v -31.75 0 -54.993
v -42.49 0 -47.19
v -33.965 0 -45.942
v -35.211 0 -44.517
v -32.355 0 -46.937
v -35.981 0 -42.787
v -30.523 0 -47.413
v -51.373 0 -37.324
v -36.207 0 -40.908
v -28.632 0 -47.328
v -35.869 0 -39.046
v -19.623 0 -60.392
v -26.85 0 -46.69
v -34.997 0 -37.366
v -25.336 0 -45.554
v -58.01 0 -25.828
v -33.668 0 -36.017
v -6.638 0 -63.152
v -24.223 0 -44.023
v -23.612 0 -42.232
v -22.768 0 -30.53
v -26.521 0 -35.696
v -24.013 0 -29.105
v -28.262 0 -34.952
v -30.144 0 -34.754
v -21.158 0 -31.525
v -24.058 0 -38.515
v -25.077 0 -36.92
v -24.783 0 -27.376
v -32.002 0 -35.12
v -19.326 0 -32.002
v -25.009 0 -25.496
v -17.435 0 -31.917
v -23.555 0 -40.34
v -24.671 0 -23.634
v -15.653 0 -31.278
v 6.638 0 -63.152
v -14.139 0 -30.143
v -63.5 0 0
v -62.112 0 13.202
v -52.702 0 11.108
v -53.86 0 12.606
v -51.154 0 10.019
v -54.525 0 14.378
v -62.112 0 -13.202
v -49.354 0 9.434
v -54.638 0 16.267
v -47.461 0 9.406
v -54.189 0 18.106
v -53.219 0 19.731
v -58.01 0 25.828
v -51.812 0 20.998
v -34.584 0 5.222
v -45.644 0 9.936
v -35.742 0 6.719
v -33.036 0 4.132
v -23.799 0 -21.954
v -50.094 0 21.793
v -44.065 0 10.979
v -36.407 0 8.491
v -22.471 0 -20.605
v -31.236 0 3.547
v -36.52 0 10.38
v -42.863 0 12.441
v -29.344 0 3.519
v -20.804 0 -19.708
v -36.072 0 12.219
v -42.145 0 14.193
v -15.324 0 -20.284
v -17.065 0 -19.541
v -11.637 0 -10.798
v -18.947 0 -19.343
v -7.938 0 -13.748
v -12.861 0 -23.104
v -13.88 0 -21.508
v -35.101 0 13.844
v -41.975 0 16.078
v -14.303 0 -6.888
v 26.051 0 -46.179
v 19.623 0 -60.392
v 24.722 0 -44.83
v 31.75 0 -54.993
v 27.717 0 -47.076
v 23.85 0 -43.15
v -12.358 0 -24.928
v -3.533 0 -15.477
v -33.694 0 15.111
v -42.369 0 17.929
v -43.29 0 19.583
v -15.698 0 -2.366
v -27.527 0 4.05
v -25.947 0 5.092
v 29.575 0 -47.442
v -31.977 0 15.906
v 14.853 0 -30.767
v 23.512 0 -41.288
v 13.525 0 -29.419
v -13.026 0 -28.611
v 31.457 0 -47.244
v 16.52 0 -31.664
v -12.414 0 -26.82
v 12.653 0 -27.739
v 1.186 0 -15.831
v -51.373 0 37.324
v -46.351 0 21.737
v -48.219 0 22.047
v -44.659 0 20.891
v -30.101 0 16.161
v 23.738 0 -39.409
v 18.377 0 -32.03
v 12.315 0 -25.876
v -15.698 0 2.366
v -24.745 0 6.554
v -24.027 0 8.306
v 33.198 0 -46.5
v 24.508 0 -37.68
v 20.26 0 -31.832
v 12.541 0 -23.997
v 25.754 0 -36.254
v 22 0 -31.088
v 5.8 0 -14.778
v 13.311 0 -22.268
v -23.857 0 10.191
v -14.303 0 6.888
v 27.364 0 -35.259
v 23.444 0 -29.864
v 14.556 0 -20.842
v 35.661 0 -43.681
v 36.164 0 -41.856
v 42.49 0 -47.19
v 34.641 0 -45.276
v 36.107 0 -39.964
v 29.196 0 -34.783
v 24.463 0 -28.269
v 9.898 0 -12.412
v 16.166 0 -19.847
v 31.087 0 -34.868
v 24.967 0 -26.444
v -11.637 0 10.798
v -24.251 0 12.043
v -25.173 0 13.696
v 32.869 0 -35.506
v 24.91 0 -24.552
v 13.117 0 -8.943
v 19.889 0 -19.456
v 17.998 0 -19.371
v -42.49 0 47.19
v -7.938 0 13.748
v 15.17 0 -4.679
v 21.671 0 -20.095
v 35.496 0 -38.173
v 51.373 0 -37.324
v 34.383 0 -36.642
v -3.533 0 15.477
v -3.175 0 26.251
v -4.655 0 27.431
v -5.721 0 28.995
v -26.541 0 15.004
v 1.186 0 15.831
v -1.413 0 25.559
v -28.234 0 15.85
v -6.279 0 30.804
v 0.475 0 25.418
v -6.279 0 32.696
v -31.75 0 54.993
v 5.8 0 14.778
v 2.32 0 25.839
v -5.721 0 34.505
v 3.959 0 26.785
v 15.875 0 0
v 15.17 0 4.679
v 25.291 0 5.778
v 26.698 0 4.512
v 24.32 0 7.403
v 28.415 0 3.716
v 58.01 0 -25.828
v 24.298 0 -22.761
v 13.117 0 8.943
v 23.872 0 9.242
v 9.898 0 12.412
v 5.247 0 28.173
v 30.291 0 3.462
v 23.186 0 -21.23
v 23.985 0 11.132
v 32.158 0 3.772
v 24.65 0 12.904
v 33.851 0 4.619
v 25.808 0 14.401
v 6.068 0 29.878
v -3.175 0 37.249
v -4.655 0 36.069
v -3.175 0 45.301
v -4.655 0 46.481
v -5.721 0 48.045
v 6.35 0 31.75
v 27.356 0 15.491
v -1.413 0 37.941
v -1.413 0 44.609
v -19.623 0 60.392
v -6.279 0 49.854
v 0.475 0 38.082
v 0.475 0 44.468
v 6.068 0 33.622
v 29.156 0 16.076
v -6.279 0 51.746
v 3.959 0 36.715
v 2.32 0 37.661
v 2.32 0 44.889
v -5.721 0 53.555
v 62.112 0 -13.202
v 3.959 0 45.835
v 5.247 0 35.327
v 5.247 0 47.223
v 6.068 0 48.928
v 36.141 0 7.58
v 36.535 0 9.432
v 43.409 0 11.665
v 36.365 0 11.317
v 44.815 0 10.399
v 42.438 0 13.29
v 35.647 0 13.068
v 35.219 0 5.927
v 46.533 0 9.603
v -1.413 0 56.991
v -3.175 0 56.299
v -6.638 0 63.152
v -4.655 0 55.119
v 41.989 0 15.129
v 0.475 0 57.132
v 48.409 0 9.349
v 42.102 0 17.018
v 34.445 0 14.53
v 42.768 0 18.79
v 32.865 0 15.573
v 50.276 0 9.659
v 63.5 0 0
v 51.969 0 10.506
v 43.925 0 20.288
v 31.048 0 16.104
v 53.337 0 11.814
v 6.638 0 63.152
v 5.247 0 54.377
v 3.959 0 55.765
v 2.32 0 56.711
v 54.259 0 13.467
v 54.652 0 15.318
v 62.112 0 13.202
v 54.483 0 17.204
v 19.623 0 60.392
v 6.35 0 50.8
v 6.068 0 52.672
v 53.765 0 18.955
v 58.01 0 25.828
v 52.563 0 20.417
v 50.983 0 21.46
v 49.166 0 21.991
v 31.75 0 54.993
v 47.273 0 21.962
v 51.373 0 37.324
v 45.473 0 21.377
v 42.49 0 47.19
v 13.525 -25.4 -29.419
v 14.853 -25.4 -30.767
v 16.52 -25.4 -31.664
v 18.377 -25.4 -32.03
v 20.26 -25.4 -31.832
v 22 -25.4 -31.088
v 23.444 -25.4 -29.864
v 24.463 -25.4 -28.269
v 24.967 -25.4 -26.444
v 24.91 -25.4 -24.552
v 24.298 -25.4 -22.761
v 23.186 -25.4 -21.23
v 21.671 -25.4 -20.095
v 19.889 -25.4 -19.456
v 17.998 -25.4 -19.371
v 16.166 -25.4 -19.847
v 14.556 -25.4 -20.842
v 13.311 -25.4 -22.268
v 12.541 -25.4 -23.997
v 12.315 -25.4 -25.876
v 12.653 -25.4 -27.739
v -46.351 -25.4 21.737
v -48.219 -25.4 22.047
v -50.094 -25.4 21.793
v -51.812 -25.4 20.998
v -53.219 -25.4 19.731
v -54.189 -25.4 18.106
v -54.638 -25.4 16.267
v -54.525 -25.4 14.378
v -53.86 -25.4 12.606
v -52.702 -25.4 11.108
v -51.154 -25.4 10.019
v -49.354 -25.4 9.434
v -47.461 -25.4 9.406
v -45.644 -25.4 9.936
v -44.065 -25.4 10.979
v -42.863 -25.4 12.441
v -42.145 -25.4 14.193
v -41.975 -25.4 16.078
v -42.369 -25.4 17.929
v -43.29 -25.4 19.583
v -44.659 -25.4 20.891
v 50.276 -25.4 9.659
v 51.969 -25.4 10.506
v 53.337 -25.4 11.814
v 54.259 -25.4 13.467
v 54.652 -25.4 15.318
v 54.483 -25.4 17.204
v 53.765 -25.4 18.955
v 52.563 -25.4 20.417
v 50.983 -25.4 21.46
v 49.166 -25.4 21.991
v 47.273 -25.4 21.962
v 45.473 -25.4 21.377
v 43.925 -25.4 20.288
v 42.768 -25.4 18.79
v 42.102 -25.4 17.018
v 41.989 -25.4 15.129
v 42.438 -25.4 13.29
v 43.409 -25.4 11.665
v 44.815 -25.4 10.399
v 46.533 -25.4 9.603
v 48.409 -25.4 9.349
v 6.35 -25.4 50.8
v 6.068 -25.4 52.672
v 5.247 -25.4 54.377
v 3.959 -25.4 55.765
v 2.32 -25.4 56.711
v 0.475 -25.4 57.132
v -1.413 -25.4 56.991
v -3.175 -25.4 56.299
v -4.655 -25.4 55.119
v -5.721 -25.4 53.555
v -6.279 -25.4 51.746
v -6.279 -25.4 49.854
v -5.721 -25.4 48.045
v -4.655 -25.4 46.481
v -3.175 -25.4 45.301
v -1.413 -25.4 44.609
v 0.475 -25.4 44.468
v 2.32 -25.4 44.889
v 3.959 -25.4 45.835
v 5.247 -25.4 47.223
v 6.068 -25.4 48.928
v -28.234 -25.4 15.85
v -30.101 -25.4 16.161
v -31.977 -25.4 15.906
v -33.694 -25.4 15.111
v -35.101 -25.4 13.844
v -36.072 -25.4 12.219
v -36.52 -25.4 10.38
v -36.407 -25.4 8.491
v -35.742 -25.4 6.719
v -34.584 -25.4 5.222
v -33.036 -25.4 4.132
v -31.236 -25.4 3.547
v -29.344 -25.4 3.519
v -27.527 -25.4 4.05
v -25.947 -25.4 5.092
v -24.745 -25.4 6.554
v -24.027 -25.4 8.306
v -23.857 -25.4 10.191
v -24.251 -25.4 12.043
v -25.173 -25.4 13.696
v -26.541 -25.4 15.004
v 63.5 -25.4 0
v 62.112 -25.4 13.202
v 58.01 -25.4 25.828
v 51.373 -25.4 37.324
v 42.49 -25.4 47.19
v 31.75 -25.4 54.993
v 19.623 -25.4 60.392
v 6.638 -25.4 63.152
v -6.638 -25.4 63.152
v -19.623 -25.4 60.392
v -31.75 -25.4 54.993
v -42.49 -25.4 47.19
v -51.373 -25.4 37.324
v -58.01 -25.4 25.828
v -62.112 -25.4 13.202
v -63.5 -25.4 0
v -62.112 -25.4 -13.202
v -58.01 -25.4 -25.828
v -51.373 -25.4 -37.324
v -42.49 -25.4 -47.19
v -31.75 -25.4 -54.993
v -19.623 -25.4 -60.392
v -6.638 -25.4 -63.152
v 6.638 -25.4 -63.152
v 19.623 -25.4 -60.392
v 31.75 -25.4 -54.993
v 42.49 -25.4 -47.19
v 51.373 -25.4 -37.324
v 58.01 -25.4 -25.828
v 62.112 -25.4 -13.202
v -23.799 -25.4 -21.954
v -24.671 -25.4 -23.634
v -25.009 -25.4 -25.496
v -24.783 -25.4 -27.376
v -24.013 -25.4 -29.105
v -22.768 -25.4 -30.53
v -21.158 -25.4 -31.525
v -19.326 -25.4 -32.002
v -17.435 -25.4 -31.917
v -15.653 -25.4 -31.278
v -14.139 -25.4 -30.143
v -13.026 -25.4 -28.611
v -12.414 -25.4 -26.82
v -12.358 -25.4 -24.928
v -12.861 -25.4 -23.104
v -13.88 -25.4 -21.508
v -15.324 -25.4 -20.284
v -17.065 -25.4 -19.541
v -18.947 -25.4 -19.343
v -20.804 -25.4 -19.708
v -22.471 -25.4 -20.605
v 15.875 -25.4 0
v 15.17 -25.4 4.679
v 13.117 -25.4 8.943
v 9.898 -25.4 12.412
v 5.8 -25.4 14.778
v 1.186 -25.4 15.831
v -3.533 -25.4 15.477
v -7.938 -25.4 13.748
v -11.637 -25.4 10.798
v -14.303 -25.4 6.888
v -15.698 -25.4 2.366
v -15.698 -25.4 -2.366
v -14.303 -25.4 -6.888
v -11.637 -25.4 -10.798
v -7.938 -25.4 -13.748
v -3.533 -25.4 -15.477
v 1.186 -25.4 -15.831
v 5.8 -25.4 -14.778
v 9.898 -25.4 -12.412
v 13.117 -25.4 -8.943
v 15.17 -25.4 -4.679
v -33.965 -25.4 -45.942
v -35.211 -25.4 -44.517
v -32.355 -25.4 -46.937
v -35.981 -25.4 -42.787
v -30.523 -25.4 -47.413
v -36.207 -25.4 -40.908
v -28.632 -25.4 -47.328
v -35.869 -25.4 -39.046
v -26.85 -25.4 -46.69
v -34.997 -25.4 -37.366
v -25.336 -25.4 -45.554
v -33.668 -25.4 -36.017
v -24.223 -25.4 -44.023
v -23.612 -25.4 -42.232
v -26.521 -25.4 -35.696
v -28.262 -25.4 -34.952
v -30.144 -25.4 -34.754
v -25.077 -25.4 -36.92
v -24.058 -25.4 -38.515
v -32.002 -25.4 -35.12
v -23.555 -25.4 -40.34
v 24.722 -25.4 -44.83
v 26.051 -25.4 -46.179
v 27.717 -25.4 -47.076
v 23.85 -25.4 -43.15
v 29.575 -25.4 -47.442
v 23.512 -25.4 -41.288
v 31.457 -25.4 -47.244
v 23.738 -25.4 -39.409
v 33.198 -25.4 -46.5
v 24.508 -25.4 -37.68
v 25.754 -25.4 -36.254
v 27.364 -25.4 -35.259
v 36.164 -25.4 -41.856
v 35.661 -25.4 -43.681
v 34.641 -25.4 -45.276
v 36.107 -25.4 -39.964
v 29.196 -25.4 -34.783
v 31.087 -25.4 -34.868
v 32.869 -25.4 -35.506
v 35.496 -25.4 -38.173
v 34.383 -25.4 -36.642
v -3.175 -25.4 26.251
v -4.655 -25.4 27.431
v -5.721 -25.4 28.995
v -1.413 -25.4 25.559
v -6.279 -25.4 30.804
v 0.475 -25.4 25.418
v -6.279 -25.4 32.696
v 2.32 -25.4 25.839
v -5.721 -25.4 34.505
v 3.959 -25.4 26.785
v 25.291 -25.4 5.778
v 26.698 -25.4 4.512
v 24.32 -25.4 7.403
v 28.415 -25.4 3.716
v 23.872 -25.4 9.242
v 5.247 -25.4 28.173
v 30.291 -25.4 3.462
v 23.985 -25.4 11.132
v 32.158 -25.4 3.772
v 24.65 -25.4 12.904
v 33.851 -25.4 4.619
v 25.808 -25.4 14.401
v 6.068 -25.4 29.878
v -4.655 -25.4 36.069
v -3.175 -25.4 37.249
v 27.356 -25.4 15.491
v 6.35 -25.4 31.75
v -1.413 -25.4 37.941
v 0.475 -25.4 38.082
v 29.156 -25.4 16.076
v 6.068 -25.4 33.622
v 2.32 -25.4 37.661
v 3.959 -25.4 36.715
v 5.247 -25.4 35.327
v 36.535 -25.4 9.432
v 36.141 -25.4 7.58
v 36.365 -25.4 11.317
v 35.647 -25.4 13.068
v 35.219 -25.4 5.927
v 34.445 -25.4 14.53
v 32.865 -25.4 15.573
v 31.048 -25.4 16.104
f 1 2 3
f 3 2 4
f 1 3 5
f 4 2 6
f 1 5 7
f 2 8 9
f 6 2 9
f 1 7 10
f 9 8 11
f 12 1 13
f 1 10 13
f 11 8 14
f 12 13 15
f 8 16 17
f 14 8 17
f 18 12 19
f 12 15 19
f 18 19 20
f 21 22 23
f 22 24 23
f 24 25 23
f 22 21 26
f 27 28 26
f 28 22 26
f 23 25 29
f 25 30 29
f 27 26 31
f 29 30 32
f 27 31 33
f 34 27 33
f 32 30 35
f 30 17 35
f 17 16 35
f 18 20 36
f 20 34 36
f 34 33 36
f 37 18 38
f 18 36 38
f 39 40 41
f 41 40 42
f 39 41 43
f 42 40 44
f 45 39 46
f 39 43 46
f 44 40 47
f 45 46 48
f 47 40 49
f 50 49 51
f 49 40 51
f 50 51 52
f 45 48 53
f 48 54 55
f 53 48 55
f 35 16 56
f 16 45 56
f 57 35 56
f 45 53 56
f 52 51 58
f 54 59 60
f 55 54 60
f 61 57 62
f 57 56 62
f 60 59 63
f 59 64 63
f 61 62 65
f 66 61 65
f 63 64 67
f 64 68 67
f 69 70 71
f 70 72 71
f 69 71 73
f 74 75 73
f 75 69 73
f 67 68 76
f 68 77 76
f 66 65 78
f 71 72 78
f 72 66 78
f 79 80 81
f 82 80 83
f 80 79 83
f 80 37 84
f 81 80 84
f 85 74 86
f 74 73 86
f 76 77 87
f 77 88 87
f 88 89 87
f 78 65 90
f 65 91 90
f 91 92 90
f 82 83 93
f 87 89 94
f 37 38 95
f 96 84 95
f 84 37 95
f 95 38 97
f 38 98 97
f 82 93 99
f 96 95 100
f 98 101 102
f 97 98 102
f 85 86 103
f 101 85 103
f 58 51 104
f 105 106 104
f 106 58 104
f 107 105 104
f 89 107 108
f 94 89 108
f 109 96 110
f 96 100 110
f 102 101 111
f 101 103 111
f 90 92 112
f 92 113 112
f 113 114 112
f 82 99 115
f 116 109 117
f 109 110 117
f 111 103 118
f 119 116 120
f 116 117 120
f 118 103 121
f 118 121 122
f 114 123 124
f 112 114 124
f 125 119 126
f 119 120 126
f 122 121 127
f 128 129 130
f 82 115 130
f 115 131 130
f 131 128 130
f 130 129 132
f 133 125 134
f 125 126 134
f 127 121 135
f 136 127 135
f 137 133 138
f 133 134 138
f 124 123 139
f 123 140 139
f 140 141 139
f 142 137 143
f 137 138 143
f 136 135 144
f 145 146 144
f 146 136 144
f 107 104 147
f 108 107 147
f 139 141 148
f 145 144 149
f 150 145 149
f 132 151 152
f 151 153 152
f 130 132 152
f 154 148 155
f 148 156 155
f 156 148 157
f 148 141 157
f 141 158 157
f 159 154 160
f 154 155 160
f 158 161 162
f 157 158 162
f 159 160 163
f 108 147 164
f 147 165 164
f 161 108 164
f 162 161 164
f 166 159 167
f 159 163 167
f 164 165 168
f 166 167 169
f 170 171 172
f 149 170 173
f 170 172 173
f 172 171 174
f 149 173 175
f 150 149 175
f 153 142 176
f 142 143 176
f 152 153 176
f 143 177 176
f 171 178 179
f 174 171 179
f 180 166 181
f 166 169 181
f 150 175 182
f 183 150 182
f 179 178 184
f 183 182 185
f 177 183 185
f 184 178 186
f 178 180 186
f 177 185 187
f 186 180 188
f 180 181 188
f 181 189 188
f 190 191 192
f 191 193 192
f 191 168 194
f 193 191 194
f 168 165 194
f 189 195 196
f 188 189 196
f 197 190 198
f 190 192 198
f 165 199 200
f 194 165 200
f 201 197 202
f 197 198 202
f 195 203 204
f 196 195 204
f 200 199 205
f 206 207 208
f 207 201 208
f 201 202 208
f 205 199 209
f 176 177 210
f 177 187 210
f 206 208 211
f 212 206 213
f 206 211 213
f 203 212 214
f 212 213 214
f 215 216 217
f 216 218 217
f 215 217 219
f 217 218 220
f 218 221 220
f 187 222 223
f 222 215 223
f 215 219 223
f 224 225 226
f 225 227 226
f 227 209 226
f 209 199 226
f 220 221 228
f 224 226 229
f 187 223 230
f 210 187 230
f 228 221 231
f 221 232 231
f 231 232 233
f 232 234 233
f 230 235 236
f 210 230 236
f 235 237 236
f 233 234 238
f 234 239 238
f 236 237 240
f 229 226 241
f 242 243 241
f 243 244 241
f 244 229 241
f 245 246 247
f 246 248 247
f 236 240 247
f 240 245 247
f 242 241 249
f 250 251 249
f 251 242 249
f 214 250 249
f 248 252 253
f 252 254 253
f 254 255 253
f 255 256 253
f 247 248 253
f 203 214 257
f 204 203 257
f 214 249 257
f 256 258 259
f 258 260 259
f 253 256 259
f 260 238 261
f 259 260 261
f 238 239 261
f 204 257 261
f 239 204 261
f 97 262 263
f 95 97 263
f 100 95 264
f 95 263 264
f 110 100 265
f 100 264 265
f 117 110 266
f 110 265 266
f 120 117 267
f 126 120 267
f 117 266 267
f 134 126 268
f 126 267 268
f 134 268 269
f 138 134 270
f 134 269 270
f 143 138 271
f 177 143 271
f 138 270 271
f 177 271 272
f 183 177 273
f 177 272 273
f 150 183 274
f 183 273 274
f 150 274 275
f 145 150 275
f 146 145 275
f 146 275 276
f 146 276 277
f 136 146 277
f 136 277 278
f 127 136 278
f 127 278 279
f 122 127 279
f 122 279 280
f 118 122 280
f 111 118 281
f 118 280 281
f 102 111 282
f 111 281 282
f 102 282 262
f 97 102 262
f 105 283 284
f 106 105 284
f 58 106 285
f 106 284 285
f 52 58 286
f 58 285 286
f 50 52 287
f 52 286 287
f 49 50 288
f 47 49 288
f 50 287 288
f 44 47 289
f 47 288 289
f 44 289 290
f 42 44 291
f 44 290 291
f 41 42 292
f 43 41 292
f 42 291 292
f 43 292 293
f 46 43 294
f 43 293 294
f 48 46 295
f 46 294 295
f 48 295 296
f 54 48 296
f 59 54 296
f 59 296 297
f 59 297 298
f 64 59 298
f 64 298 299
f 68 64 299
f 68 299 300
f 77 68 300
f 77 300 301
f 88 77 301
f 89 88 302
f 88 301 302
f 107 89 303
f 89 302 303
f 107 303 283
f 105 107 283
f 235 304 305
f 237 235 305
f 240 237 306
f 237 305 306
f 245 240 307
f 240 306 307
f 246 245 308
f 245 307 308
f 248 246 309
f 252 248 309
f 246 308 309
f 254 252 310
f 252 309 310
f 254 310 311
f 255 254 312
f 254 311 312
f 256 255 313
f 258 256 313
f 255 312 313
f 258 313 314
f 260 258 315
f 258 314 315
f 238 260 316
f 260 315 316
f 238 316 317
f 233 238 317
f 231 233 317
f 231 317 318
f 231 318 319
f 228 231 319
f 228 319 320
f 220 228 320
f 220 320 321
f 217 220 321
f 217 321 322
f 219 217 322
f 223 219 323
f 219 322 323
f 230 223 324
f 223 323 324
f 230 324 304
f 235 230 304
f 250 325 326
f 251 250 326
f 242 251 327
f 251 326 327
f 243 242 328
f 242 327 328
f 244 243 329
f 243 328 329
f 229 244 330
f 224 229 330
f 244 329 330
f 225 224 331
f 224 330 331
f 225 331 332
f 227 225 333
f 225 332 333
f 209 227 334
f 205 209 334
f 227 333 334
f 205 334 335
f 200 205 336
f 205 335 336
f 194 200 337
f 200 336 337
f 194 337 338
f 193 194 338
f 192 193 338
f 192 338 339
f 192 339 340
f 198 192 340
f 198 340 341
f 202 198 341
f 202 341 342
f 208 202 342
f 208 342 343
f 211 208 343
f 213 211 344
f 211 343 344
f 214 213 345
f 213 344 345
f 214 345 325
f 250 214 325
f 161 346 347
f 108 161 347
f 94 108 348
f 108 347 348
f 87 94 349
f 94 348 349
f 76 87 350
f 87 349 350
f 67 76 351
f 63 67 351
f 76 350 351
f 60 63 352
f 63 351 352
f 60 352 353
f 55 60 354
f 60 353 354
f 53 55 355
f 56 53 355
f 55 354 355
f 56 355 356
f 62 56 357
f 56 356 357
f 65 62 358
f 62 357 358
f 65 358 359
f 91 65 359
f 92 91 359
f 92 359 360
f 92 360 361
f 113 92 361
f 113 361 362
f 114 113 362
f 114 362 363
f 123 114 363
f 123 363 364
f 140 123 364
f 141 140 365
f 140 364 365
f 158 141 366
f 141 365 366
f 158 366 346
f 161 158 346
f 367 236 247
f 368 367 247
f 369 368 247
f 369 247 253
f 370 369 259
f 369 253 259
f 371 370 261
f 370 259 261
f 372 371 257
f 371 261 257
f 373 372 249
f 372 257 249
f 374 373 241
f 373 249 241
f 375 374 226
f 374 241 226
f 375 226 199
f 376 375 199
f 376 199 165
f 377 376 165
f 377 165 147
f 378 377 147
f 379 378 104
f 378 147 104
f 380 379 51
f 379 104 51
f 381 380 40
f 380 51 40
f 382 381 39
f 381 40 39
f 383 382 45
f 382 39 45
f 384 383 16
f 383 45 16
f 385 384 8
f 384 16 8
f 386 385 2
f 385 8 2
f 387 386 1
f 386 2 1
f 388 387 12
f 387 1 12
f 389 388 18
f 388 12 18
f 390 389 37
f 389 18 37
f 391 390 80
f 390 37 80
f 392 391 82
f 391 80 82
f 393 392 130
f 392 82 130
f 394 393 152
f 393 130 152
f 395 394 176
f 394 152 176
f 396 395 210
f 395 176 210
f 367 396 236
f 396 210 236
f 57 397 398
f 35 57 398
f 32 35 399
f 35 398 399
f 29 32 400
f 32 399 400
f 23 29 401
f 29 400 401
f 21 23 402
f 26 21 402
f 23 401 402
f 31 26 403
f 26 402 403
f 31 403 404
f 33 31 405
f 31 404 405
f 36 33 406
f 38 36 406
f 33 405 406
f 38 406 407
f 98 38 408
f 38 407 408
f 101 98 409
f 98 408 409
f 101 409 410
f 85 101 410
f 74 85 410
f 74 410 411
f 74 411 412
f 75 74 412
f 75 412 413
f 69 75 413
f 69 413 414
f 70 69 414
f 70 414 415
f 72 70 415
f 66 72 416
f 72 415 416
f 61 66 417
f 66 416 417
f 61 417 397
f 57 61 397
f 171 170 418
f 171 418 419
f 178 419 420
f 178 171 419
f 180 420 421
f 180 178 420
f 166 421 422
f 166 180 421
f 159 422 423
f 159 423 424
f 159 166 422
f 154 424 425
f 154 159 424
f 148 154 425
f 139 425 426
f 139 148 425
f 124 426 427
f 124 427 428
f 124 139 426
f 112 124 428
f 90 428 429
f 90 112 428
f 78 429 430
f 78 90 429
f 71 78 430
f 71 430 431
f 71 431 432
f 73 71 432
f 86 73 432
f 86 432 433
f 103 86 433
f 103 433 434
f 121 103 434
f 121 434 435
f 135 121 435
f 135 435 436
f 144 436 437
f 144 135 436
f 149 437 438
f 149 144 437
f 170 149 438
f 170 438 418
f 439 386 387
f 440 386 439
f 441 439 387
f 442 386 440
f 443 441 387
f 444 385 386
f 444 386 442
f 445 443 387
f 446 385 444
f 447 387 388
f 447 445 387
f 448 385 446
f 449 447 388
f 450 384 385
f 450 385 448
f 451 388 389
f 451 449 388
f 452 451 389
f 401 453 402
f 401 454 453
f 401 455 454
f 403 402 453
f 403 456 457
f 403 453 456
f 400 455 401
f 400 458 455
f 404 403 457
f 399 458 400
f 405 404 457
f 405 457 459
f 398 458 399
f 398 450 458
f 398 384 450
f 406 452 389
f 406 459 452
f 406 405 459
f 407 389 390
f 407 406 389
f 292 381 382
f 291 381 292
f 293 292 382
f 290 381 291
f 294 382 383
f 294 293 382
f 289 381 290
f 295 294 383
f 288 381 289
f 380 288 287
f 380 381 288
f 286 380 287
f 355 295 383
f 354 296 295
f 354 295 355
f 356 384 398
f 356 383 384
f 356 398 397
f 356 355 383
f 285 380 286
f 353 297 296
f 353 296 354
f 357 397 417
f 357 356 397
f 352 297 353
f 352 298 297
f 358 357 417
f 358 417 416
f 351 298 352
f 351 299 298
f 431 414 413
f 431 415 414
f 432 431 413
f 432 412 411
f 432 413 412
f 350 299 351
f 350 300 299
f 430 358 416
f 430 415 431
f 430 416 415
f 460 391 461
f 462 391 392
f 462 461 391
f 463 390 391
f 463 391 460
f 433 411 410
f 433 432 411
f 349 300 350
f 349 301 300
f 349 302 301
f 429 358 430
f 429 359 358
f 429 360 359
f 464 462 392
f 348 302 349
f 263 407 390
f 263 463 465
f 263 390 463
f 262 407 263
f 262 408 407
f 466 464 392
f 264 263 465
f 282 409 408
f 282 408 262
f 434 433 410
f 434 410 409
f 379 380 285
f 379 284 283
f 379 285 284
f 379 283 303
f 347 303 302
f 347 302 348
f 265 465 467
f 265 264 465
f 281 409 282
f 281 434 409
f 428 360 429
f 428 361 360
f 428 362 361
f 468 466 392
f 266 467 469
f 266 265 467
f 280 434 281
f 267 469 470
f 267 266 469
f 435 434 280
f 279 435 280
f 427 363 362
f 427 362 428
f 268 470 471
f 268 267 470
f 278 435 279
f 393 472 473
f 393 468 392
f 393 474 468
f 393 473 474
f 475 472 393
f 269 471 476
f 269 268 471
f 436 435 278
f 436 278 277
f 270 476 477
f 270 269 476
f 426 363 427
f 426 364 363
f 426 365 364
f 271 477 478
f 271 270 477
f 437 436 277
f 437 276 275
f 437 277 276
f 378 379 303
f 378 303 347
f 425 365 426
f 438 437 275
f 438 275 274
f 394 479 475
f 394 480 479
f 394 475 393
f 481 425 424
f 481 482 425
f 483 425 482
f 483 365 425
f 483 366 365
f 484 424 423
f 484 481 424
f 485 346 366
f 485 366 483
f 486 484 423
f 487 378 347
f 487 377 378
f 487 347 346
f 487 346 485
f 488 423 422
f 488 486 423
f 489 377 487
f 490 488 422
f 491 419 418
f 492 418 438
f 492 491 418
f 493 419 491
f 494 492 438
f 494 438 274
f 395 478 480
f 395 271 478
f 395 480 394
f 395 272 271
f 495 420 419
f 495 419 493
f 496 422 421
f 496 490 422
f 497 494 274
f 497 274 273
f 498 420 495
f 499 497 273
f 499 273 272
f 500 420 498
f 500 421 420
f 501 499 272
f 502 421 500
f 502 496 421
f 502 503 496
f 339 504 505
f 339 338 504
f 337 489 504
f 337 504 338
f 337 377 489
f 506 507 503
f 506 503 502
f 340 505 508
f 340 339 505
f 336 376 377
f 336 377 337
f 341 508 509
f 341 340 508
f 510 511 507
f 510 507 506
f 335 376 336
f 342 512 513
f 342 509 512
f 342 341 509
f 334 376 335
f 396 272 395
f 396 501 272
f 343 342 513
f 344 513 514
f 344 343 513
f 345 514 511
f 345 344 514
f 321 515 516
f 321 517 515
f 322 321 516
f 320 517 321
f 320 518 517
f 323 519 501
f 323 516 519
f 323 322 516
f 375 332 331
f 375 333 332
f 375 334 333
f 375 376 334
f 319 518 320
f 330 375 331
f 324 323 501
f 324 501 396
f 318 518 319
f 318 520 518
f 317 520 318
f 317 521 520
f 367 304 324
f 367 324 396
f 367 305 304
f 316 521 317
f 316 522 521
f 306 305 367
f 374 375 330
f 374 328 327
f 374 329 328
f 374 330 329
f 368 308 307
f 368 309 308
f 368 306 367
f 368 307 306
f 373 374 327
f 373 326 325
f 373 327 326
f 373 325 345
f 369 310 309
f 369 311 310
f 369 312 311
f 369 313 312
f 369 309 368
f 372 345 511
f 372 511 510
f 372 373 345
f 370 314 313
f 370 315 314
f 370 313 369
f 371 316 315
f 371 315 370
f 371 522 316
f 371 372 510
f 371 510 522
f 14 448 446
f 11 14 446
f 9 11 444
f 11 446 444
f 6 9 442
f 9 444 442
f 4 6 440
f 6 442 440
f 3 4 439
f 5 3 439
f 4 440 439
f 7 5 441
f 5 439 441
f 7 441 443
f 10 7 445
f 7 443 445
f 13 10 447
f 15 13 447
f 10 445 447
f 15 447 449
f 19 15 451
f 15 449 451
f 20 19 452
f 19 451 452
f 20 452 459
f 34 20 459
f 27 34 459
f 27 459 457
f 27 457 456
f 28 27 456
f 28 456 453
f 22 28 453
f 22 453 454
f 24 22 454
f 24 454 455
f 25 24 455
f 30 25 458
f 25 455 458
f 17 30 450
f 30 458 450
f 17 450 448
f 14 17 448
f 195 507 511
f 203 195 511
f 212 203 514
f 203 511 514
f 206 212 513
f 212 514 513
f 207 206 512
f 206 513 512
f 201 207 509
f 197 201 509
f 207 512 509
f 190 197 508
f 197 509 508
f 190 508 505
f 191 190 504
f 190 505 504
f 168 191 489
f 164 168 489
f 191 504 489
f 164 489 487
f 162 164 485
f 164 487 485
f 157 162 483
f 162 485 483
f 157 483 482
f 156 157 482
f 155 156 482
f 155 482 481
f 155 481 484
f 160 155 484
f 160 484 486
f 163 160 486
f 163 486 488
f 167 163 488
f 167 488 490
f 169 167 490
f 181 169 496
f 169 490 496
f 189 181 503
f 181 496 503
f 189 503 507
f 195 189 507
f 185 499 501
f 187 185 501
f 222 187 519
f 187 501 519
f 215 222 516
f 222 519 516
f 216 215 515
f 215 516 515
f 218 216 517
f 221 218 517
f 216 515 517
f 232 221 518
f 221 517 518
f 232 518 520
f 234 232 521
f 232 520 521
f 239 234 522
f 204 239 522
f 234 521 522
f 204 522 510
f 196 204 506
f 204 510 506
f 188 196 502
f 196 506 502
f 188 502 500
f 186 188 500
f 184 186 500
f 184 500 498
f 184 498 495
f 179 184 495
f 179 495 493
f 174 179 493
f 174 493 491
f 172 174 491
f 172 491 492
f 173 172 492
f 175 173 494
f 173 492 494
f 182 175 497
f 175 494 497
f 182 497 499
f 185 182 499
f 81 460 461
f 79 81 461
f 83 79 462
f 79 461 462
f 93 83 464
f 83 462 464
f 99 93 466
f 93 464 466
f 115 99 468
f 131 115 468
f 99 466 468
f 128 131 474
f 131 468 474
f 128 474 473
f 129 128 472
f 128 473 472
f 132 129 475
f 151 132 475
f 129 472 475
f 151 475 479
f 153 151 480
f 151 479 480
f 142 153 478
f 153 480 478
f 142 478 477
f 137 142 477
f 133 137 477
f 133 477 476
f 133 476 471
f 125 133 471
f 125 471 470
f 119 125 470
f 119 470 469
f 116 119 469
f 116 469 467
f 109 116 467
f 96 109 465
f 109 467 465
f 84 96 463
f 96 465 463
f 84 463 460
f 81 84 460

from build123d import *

# Parameters (mm, degrees)
F0_R            = 63.5
F0_R_2          = 15.875
F1_DEPTH        = 25.4
F2_R            = 6.35
F3_DEPTH        = 25.4
F3_COPIES_COUNT = 5


# Not quite as in the source:
# - a pattern or mirror of a feature is missing from the dataset's text; its kind, count and spacing are read off the source's solid


with BuildPart() as f1:
    # F0 (on Front) → F1 (new body)
    with BuildSketch(Plane.XZ):
        Circle(F0_R)
        Circle(F0_R_2, mode=Mode.SUBTRACT)
    extrude(amount=F1_DEPTH)

    # F2 (on face) → F3 (cut, through all)
    with BuildSketch(Plane.XZ.offset(25.4)):
        with Locations((0, 50.8)):
            Circle(F2_R)
        with Locations((0, 31.75)):
            Circle(F2_R)
    f3 = extrude(amount=-F3_DEPTH, mode=Mode.SUBTRACT)

    # F3_copies: F3 ×5 about axis
    f3_copies_axis = Axis((0, 0, 0), (0, 1, 0))
    for i in range(1, F3_COPIES_COUNT):
        add(f3.rotate(f3_copies_axis, i * 360 / F3_COPIES_COUNT), mode=Mode.SUBTRACT)


solid = f1.part
